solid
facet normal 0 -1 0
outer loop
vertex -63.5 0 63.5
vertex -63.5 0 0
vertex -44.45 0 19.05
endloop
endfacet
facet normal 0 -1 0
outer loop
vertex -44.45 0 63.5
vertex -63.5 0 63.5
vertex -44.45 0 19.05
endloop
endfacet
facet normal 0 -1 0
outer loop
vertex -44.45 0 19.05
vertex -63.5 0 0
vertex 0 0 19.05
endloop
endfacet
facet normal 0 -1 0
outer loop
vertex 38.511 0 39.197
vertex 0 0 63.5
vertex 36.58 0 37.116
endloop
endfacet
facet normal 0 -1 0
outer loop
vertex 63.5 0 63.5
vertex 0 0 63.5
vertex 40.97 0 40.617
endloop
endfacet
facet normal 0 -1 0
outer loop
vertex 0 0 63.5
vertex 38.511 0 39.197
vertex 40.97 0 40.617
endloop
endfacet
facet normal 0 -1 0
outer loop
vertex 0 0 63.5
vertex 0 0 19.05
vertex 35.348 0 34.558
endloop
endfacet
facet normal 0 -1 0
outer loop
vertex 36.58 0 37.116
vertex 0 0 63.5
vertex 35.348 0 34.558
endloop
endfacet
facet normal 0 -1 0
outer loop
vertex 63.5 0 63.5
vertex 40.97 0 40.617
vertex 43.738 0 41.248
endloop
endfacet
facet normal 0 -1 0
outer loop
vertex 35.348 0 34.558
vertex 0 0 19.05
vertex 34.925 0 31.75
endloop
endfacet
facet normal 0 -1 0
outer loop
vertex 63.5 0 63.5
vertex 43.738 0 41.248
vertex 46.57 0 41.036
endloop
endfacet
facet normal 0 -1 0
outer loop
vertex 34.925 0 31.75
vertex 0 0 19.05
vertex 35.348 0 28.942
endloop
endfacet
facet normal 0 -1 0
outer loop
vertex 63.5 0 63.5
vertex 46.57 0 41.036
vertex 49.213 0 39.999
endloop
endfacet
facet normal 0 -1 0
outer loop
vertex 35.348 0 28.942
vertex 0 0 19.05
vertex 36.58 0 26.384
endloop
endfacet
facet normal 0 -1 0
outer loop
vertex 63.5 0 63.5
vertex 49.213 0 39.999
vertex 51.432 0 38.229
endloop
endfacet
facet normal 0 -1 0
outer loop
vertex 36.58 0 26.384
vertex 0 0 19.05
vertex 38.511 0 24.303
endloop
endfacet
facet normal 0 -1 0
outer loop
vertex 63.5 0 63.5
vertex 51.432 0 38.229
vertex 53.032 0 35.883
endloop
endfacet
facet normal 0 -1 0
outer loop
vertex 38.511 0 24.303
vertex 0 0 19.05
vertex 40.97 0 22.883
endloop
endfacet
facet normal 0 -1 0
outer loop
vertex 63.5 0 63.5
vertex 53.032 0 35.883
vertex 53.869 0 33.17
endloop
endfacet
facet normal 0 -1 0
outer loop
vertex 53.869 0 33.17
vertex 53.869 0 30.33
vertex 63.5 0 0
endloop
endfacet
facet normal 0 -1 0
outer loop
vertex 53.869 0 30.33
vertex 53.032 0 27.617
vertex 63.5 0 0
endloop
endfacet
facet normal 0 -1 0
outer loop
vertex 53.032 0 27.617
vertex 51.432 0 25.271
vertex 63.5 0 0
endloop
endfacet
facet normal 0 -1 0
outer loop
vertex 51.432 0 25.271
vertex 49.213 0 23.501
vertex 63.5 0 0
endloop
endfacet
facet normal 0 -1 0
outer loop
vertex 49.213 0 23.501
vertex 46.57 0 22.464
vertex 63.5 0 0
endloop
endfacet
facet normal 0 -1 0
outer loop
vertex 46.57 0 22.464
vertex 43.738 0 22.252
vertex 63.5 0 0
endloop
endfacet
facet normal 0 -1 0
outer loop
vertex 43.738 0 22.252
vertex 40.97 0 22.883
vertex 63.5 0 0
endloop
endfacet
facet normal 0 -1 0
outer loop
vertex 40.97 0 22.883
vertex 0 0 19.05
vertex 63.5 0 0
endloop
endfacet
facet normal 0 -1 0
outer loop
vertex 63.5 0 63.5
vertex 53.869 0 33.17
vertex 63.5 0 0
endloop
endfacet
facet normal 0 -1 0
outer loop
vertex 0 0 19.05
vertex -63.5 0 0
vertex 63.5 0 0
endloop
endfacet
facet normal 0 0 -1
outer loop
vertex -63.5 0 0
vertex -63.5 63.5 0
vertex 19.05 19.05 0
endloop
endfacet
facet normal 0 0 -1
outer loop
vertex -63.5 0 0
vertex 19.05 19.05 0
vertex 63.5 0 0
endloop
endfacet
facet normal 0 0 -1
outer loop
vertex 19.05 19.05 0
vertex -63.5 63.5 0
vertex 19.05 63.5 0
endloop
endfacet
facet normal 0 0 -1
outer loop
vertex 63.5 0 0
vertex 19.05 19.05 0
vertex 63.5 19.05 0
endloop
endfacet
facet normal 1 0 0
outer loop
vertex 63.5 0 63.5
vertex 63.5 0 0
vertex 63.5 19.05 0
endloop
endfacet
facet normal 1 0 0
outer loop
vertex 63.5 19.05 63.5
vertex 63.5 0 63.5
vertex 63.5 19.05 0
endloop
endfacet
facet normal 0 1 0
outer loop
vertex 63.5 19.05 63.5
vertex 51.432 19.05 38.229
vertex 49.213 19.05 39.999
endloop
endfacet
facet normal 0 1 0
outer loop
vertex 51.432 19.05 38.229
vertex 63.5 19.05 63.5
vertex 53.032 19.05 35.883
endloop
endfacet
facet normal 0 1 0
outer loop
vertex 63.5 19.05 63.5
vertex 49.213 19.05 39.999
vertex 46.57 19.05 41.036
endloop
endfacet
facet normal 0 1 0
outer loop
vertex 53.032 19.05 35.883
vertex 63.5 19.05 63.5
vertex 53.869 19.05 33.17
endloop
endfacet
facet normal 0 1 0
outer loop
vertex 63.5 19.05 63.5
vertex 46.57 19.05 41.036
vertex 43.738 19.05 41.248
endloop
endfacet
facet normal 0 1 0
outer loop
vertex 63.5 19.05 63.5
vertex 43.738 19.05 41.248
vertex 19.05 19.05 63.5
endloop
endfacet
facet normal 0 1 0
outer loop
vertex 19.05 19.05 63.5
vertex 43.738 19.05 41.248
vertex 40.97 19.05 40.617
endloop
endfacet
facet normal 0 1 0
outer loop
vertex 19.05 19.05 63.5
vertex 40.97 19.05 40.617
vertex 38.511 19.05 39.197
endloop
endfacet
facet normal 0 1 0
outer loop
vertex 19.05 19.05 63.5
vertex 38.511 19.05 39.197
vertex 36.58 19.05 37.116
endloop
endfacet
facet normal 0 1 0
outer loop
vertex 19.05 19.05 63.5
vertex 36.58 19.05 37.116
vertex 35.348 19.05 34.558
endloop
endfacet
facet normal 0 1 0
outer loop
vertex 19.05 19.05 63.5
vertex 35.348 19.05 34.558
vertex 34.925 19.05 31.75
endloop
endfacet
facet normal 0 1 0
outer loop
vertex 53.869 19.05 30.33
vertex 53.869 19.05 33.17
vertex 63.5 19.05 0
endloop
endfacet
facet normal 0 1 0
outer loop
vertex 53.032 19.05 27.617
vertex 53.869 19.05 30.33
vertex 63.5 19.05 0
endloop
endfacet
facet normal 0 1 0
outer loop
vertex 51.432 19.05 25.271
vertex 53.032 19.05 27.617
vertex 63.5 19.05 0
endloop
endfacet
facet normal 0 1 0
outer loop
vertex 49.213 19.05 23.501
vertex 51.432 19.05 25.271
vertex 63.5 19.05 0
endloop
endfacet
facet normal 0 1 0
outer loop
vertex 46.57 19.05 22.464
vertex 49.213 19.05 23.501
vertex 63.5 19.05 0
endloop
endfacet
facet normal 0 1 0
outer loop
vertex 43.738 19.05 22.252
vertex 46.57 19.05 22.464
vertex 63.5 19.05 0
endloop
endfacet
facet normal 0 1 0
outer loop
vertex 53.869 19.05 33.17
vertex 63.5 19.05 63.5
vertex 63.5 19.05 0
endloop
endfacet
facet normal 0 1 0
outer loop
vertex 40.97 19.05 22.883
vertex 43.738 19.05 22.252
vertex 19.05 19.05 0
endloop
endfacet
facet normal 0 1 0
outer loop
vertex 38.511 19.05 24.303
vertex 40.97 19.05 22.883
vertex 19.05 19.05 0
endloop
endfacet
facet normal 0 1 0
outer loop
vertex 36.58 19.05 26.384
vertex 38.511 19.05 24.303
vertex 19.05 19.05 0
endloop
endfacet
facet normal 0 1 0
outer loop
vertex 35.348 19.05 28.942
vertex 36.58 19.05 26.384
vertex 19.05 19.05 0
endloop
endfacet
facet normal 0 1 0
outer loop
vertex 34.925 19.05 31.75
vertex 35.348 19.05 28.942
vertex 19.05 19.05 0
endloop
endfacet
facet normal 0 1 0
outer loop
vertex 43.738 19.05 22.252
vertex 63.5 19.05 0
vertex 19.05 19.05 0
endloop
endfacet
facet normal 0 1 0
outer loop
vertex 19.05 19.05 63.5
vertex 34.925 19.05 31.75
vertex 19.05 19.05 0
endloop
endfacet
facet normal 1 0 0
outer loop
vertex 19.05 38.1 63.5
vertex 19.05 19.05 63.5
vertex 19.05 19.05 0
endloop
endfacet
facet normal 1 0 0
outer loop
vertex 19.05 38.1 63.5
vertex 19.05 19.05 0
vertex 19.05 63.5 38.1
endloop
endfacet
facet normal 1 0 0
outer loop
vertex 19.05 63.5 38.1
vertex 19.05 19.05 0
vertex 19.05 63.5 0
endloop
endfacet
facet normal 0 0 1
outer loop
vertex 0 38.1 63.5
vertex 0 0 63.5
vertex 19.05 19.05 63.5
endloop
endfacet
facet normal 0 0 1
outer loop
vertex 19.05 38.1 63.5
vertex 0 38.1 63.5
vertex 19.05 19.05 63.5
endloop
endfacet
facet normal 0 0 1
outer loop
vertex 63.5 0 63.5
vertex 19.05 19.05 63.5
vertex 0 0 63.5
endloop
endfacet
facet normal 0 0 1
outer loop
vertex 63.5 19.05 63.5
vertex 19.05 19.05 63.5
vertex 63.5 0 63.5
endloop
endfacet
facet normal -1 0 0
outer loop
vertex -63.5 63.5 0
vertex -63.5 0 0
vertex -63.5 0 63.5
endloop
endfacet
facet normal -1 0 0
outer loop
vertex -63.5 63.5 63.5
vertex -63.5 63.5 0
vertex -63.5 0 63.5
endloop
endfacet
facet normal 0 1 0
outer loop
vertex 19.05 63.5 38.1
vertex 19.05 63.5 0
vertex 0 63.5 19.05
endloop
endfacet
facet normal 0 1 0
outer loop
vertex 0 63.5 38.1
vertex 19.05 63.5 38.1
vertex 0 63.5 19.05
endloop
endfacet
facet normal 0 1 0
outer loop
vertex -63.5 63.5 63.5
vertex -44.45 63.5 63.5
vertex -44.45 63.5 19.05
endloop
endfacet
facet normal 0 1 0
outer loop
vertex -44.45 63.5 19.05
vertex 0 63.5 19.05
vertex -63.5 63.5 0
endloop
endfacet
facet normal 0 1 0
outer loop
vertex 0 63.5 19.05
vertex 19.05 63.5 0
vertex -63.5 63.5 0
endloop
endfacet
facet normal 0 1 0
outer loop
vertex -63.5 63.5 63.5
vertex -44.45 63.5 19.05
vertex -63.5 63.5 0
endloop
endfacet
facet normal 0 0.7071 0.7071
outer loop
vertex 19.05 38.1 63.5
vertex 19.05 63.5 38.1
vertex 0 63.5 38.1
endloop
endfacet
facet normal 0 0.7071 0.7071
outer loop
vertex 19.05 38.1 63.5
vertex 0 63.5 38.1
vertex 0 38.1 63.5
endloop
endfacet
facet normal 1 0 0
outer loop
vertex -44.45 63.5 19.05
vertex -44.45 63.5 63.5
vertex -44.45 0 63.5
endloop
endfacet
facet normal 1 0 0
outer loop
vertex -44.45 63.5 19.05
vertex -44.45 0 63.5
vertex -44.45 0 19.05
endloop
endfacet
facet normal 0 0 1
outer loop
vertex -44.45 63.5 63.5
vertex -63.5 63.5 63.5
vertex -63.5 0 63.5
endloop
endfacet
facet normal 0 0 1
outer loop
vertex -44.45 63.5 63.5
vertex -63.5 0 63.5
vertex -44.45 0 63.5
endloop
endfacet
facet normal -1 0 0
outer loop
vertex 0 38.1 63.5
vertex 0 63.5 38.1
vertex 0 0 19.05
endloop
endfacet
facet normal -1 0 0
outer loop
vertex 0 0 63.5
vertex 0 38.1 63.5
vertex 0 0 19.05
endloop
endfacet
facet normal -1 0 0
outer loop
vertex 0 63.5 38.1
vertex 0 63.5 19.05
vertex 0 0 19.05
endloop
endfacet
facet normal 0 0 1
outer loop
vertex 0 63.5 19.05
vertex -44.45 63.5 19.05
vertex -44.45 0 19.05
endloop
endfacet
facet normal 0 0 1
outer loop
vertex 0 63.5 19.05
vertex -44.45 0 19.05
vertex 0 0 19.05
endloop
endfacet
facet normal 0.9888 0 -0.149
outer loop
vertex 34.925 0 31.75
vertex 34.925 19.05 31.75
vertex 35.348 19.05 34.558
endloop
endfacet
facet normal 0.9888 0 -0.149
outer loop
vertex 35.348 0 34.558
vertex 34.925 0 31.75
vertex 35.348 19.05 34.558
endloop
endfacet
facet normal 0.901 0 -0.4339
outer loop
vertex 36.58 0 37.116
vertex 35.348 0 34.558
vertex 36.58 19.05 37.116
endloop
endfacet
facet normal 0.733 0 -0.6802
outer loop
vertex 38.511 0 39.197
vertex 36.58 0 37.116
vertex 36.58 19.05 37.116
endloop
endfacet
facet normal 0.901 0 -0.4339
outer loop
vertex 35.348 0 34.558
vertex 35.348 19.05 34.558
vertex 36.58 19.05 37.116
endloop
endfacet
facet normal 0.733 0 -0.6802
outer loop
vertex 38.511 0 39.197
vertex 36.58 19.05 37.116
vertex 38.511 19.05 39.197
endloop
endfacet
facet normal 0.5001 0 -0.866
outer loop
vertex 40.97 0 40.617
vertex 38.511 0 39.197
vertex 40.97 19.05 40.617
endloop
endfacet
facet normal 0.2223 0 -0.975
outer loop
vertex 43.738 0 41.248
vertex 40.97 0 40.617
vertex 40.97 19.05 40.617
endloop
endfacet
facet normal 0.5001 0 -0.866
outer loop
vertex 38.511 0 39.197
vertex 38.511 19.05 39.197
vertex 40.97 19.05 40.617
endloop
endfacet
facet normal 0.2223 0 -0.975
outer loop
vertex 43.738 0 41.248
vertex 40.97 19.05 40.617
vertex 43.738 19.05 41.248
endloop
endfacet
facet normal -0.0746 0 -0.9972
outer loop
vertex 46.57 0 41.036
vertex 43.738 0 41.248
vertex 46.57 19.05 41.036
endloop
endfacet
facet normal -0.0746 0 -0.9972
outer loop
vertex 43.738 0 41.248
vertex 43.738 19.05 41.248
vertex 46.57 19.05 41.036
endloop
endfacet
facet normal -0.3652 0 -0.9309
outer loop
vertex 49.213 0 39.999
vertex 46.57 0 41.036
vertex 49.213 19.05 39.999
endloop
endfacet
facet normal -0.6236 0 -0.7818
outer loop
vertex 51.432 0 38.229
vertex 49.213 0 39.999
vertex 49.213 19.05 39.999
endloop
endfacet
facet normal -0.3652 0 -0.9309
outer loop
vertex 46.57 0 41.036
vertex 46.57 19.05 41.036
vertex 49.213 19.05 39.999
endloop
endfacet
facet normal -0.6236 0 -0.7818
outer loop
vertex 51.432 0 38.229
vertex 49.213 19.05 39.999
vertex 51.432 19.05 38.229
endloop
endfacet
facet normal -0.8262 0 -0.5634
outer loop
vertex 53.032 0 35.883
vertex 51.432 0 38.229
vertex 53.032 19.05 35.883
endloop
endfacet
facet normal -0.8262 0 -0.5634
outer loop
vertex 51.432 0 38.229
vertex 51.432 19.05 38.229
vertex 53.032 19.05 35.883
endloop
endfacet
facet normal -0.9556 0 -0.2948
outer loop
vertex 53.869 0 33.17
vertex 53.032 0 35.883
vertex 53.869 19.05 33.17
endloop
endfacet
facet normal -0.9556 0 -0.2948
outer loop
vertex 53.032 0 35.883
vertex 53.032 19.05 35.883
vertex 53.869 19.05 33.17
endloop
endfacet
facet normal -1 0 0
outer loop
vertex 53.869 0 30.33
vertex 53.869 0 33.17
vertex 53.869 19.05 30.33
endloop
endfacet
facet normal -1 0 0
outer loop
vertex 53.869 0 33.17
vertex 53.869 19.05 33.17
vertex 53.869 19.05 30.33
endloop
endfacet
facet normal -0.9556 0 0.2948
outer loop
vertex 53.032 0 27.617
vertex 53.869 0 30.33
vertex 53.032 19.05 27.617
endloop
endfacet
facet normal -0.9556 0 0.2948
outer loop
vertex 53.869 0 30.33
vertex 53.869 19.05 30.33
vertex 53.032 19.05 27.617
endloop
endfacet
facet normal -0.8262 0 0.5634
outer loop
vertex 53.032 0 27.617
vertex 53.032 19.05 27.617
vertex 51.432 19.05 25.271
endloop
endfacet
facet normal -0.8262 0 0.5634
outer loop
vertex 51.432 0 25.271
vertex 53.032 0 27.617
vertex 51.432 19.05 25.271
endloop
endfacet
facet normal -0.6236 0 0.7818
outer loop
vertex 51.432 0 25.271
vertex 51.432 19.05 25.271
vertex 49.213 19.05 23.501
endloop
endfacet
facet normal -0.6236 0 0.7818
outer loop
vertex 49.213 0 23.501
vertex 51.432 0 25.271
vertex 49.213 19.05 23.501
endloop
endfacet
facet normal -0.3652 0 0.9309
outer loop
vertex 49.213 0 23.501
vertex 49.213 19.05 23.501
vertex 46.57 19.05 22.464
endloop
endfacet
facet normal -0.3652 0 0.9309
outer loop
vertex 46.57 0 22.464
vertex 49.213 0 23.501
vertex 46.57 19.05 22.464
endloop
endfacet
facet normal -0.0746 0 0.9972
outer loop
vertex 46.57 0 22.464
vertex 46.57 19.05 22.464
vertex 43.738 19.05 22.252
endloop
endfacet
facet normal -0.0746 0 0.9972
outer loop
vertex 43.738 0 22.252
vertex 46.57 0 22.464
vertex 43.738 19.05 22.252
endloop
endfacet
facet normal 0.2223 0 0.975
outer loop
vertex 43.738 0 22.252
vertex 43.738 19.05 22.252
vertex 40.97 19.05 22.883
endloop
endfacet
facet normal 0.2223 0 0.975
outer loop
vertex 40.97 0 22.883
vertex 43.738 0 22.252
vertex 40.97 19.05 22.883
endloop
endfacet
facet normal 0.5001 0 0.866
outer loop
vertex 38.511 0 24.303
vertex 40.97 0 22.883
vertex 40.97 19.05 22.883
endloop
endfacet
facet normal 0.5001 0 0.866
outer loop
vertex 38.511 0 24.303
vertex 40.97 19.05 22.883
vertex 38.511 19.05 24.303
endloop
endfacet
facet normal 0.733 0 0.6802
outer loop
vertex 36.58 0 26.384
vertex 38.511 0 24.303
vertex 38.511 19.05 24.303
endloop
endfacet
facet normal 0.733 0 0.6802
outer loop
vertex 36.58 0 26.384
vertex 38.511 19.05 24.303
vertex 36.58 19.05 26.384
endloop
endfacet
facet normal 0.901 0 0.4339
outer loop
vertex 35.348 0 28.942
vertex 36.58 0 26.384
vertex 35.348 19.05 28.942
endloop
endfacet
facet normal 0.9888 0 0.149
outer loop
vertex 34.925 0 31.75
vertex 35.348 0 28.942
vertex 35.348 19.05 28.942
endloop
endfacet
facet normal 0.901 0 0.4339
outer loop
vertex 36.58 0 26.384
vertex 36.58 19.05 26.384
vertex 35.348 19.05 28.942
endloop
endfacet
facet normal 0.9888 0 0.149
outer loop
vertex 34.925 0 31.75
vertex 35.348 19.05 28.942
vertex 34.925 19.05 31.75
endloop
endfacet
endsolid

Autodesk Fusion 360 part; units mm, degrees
sketch "Sketch1" plane through (0, 0, 0) normal (0, 0, 1) x (1, 0, 0) in component "Component"
  line L0 (0, 0) -> (63.5, 0)
  line L1 (63.5, 0) -> (63.5, 19.05)
  line L2 (63.5, 19.05) -> (19.05, 19.05)
  line L3 (19.05, 19.05) -> (19.05, 63.5)
  line L4 (19.05, 63.5) -> (0, 63.5)
  line L5 (0, 63.5) -> (0, 0)
  dimension "d1" = 63.5
  dimension "d2" = 63.5
  dimension "d3" = 19.05
  dimension "d4" = 19.05
extrude "Extrude1" add sketch "Sketch1" along normal blind 63.5 in component "Component"
sketch "Sketch2" plane through (0, 63.5, 0) normal (0, 1, 0) x (-1, 0, 0) in component "Component"
  line L0 (-19.05, 0) -> (0, 0)
  line L1 (0, 0) -> (0, 63.5)
  line L2 (0, 63.5) -> (-19.05, 63.5)
  line L3 (-19.05, 63.5) -> (-19.05, 0)
  line L4 (0, 0) -> (63.5, 0)
  line L5 (63.5, 0) -> (63.5, 63.5)
  line L6 (63.5, 63.5) -> (44.45, 63.5)
  line L7 (44.45, 63.5) -> (44.45, 19.05)
  line L8 (44.45, 19.05) -> (0, 19.05)
  line L9 (0, 19.05) -> (0, 0)
  dimension "d7" = 63.5
  dimension "d8" = 63.5
  dimension "d9" = 19.05
  dimension "d10" = 19.05
extrude "Extrude2" add sketch "Sketch2" against normal blind 63.5 contours L1 L4 L5 L6 L7 L8 L9 in component "Component"
sketch "Sketch3" plane through (0, 19.05, 0) normal (0, 1, 0) x (-1, 0, 0) in component "Component"
  line L0 (-63.5, 0) -> (-19.05, 0)
  line L1 (-19.05, 0) -> (-19.05, 63.5)
  line L2 (-19.05, 63.5) -> (-63.5, 63.5)
  line L3 (-63.5, 63.5) -> (-63.5, 0)
  circle A0 centre (-44.45, 31.75) radius 9.525
  dimension "d13" = 19.05
  dimension "d14" = 31.75
  dimension "d15" = 19.05
extrude "Extrude3" cut sketch "Sketch3" against normal through all contours A0 in component "Component"
sketch "Sketch4" plane through (19.05, 0, 0) normal (1, 0, 0) x (0, 1, 0) in component "Component"
  line L0 (19.05, 0) -> (63.5, 0)
  line L1 (63.5, 0) -> (63.5, 63.5)
  line L2 (63.5, 63.5) -> (19.05, 63.5)
  line L3 (19.05, 63.5) -> (19.05, 0)
  line L4 (63.5, 38.1) -> (38.1, 63.5)
  dimension "d17" = 25.4
  dimension "d18" = 45
extrude "Extrude4" cut sketch "Sketch4" against normal up to surface (19.05 mm away) contours L1 L2 L4 in component "Component"
component "Component" placed x (1, 0, 0) y (0, 1, 0) z (0, 0, 1) at (0, 0, 0)
